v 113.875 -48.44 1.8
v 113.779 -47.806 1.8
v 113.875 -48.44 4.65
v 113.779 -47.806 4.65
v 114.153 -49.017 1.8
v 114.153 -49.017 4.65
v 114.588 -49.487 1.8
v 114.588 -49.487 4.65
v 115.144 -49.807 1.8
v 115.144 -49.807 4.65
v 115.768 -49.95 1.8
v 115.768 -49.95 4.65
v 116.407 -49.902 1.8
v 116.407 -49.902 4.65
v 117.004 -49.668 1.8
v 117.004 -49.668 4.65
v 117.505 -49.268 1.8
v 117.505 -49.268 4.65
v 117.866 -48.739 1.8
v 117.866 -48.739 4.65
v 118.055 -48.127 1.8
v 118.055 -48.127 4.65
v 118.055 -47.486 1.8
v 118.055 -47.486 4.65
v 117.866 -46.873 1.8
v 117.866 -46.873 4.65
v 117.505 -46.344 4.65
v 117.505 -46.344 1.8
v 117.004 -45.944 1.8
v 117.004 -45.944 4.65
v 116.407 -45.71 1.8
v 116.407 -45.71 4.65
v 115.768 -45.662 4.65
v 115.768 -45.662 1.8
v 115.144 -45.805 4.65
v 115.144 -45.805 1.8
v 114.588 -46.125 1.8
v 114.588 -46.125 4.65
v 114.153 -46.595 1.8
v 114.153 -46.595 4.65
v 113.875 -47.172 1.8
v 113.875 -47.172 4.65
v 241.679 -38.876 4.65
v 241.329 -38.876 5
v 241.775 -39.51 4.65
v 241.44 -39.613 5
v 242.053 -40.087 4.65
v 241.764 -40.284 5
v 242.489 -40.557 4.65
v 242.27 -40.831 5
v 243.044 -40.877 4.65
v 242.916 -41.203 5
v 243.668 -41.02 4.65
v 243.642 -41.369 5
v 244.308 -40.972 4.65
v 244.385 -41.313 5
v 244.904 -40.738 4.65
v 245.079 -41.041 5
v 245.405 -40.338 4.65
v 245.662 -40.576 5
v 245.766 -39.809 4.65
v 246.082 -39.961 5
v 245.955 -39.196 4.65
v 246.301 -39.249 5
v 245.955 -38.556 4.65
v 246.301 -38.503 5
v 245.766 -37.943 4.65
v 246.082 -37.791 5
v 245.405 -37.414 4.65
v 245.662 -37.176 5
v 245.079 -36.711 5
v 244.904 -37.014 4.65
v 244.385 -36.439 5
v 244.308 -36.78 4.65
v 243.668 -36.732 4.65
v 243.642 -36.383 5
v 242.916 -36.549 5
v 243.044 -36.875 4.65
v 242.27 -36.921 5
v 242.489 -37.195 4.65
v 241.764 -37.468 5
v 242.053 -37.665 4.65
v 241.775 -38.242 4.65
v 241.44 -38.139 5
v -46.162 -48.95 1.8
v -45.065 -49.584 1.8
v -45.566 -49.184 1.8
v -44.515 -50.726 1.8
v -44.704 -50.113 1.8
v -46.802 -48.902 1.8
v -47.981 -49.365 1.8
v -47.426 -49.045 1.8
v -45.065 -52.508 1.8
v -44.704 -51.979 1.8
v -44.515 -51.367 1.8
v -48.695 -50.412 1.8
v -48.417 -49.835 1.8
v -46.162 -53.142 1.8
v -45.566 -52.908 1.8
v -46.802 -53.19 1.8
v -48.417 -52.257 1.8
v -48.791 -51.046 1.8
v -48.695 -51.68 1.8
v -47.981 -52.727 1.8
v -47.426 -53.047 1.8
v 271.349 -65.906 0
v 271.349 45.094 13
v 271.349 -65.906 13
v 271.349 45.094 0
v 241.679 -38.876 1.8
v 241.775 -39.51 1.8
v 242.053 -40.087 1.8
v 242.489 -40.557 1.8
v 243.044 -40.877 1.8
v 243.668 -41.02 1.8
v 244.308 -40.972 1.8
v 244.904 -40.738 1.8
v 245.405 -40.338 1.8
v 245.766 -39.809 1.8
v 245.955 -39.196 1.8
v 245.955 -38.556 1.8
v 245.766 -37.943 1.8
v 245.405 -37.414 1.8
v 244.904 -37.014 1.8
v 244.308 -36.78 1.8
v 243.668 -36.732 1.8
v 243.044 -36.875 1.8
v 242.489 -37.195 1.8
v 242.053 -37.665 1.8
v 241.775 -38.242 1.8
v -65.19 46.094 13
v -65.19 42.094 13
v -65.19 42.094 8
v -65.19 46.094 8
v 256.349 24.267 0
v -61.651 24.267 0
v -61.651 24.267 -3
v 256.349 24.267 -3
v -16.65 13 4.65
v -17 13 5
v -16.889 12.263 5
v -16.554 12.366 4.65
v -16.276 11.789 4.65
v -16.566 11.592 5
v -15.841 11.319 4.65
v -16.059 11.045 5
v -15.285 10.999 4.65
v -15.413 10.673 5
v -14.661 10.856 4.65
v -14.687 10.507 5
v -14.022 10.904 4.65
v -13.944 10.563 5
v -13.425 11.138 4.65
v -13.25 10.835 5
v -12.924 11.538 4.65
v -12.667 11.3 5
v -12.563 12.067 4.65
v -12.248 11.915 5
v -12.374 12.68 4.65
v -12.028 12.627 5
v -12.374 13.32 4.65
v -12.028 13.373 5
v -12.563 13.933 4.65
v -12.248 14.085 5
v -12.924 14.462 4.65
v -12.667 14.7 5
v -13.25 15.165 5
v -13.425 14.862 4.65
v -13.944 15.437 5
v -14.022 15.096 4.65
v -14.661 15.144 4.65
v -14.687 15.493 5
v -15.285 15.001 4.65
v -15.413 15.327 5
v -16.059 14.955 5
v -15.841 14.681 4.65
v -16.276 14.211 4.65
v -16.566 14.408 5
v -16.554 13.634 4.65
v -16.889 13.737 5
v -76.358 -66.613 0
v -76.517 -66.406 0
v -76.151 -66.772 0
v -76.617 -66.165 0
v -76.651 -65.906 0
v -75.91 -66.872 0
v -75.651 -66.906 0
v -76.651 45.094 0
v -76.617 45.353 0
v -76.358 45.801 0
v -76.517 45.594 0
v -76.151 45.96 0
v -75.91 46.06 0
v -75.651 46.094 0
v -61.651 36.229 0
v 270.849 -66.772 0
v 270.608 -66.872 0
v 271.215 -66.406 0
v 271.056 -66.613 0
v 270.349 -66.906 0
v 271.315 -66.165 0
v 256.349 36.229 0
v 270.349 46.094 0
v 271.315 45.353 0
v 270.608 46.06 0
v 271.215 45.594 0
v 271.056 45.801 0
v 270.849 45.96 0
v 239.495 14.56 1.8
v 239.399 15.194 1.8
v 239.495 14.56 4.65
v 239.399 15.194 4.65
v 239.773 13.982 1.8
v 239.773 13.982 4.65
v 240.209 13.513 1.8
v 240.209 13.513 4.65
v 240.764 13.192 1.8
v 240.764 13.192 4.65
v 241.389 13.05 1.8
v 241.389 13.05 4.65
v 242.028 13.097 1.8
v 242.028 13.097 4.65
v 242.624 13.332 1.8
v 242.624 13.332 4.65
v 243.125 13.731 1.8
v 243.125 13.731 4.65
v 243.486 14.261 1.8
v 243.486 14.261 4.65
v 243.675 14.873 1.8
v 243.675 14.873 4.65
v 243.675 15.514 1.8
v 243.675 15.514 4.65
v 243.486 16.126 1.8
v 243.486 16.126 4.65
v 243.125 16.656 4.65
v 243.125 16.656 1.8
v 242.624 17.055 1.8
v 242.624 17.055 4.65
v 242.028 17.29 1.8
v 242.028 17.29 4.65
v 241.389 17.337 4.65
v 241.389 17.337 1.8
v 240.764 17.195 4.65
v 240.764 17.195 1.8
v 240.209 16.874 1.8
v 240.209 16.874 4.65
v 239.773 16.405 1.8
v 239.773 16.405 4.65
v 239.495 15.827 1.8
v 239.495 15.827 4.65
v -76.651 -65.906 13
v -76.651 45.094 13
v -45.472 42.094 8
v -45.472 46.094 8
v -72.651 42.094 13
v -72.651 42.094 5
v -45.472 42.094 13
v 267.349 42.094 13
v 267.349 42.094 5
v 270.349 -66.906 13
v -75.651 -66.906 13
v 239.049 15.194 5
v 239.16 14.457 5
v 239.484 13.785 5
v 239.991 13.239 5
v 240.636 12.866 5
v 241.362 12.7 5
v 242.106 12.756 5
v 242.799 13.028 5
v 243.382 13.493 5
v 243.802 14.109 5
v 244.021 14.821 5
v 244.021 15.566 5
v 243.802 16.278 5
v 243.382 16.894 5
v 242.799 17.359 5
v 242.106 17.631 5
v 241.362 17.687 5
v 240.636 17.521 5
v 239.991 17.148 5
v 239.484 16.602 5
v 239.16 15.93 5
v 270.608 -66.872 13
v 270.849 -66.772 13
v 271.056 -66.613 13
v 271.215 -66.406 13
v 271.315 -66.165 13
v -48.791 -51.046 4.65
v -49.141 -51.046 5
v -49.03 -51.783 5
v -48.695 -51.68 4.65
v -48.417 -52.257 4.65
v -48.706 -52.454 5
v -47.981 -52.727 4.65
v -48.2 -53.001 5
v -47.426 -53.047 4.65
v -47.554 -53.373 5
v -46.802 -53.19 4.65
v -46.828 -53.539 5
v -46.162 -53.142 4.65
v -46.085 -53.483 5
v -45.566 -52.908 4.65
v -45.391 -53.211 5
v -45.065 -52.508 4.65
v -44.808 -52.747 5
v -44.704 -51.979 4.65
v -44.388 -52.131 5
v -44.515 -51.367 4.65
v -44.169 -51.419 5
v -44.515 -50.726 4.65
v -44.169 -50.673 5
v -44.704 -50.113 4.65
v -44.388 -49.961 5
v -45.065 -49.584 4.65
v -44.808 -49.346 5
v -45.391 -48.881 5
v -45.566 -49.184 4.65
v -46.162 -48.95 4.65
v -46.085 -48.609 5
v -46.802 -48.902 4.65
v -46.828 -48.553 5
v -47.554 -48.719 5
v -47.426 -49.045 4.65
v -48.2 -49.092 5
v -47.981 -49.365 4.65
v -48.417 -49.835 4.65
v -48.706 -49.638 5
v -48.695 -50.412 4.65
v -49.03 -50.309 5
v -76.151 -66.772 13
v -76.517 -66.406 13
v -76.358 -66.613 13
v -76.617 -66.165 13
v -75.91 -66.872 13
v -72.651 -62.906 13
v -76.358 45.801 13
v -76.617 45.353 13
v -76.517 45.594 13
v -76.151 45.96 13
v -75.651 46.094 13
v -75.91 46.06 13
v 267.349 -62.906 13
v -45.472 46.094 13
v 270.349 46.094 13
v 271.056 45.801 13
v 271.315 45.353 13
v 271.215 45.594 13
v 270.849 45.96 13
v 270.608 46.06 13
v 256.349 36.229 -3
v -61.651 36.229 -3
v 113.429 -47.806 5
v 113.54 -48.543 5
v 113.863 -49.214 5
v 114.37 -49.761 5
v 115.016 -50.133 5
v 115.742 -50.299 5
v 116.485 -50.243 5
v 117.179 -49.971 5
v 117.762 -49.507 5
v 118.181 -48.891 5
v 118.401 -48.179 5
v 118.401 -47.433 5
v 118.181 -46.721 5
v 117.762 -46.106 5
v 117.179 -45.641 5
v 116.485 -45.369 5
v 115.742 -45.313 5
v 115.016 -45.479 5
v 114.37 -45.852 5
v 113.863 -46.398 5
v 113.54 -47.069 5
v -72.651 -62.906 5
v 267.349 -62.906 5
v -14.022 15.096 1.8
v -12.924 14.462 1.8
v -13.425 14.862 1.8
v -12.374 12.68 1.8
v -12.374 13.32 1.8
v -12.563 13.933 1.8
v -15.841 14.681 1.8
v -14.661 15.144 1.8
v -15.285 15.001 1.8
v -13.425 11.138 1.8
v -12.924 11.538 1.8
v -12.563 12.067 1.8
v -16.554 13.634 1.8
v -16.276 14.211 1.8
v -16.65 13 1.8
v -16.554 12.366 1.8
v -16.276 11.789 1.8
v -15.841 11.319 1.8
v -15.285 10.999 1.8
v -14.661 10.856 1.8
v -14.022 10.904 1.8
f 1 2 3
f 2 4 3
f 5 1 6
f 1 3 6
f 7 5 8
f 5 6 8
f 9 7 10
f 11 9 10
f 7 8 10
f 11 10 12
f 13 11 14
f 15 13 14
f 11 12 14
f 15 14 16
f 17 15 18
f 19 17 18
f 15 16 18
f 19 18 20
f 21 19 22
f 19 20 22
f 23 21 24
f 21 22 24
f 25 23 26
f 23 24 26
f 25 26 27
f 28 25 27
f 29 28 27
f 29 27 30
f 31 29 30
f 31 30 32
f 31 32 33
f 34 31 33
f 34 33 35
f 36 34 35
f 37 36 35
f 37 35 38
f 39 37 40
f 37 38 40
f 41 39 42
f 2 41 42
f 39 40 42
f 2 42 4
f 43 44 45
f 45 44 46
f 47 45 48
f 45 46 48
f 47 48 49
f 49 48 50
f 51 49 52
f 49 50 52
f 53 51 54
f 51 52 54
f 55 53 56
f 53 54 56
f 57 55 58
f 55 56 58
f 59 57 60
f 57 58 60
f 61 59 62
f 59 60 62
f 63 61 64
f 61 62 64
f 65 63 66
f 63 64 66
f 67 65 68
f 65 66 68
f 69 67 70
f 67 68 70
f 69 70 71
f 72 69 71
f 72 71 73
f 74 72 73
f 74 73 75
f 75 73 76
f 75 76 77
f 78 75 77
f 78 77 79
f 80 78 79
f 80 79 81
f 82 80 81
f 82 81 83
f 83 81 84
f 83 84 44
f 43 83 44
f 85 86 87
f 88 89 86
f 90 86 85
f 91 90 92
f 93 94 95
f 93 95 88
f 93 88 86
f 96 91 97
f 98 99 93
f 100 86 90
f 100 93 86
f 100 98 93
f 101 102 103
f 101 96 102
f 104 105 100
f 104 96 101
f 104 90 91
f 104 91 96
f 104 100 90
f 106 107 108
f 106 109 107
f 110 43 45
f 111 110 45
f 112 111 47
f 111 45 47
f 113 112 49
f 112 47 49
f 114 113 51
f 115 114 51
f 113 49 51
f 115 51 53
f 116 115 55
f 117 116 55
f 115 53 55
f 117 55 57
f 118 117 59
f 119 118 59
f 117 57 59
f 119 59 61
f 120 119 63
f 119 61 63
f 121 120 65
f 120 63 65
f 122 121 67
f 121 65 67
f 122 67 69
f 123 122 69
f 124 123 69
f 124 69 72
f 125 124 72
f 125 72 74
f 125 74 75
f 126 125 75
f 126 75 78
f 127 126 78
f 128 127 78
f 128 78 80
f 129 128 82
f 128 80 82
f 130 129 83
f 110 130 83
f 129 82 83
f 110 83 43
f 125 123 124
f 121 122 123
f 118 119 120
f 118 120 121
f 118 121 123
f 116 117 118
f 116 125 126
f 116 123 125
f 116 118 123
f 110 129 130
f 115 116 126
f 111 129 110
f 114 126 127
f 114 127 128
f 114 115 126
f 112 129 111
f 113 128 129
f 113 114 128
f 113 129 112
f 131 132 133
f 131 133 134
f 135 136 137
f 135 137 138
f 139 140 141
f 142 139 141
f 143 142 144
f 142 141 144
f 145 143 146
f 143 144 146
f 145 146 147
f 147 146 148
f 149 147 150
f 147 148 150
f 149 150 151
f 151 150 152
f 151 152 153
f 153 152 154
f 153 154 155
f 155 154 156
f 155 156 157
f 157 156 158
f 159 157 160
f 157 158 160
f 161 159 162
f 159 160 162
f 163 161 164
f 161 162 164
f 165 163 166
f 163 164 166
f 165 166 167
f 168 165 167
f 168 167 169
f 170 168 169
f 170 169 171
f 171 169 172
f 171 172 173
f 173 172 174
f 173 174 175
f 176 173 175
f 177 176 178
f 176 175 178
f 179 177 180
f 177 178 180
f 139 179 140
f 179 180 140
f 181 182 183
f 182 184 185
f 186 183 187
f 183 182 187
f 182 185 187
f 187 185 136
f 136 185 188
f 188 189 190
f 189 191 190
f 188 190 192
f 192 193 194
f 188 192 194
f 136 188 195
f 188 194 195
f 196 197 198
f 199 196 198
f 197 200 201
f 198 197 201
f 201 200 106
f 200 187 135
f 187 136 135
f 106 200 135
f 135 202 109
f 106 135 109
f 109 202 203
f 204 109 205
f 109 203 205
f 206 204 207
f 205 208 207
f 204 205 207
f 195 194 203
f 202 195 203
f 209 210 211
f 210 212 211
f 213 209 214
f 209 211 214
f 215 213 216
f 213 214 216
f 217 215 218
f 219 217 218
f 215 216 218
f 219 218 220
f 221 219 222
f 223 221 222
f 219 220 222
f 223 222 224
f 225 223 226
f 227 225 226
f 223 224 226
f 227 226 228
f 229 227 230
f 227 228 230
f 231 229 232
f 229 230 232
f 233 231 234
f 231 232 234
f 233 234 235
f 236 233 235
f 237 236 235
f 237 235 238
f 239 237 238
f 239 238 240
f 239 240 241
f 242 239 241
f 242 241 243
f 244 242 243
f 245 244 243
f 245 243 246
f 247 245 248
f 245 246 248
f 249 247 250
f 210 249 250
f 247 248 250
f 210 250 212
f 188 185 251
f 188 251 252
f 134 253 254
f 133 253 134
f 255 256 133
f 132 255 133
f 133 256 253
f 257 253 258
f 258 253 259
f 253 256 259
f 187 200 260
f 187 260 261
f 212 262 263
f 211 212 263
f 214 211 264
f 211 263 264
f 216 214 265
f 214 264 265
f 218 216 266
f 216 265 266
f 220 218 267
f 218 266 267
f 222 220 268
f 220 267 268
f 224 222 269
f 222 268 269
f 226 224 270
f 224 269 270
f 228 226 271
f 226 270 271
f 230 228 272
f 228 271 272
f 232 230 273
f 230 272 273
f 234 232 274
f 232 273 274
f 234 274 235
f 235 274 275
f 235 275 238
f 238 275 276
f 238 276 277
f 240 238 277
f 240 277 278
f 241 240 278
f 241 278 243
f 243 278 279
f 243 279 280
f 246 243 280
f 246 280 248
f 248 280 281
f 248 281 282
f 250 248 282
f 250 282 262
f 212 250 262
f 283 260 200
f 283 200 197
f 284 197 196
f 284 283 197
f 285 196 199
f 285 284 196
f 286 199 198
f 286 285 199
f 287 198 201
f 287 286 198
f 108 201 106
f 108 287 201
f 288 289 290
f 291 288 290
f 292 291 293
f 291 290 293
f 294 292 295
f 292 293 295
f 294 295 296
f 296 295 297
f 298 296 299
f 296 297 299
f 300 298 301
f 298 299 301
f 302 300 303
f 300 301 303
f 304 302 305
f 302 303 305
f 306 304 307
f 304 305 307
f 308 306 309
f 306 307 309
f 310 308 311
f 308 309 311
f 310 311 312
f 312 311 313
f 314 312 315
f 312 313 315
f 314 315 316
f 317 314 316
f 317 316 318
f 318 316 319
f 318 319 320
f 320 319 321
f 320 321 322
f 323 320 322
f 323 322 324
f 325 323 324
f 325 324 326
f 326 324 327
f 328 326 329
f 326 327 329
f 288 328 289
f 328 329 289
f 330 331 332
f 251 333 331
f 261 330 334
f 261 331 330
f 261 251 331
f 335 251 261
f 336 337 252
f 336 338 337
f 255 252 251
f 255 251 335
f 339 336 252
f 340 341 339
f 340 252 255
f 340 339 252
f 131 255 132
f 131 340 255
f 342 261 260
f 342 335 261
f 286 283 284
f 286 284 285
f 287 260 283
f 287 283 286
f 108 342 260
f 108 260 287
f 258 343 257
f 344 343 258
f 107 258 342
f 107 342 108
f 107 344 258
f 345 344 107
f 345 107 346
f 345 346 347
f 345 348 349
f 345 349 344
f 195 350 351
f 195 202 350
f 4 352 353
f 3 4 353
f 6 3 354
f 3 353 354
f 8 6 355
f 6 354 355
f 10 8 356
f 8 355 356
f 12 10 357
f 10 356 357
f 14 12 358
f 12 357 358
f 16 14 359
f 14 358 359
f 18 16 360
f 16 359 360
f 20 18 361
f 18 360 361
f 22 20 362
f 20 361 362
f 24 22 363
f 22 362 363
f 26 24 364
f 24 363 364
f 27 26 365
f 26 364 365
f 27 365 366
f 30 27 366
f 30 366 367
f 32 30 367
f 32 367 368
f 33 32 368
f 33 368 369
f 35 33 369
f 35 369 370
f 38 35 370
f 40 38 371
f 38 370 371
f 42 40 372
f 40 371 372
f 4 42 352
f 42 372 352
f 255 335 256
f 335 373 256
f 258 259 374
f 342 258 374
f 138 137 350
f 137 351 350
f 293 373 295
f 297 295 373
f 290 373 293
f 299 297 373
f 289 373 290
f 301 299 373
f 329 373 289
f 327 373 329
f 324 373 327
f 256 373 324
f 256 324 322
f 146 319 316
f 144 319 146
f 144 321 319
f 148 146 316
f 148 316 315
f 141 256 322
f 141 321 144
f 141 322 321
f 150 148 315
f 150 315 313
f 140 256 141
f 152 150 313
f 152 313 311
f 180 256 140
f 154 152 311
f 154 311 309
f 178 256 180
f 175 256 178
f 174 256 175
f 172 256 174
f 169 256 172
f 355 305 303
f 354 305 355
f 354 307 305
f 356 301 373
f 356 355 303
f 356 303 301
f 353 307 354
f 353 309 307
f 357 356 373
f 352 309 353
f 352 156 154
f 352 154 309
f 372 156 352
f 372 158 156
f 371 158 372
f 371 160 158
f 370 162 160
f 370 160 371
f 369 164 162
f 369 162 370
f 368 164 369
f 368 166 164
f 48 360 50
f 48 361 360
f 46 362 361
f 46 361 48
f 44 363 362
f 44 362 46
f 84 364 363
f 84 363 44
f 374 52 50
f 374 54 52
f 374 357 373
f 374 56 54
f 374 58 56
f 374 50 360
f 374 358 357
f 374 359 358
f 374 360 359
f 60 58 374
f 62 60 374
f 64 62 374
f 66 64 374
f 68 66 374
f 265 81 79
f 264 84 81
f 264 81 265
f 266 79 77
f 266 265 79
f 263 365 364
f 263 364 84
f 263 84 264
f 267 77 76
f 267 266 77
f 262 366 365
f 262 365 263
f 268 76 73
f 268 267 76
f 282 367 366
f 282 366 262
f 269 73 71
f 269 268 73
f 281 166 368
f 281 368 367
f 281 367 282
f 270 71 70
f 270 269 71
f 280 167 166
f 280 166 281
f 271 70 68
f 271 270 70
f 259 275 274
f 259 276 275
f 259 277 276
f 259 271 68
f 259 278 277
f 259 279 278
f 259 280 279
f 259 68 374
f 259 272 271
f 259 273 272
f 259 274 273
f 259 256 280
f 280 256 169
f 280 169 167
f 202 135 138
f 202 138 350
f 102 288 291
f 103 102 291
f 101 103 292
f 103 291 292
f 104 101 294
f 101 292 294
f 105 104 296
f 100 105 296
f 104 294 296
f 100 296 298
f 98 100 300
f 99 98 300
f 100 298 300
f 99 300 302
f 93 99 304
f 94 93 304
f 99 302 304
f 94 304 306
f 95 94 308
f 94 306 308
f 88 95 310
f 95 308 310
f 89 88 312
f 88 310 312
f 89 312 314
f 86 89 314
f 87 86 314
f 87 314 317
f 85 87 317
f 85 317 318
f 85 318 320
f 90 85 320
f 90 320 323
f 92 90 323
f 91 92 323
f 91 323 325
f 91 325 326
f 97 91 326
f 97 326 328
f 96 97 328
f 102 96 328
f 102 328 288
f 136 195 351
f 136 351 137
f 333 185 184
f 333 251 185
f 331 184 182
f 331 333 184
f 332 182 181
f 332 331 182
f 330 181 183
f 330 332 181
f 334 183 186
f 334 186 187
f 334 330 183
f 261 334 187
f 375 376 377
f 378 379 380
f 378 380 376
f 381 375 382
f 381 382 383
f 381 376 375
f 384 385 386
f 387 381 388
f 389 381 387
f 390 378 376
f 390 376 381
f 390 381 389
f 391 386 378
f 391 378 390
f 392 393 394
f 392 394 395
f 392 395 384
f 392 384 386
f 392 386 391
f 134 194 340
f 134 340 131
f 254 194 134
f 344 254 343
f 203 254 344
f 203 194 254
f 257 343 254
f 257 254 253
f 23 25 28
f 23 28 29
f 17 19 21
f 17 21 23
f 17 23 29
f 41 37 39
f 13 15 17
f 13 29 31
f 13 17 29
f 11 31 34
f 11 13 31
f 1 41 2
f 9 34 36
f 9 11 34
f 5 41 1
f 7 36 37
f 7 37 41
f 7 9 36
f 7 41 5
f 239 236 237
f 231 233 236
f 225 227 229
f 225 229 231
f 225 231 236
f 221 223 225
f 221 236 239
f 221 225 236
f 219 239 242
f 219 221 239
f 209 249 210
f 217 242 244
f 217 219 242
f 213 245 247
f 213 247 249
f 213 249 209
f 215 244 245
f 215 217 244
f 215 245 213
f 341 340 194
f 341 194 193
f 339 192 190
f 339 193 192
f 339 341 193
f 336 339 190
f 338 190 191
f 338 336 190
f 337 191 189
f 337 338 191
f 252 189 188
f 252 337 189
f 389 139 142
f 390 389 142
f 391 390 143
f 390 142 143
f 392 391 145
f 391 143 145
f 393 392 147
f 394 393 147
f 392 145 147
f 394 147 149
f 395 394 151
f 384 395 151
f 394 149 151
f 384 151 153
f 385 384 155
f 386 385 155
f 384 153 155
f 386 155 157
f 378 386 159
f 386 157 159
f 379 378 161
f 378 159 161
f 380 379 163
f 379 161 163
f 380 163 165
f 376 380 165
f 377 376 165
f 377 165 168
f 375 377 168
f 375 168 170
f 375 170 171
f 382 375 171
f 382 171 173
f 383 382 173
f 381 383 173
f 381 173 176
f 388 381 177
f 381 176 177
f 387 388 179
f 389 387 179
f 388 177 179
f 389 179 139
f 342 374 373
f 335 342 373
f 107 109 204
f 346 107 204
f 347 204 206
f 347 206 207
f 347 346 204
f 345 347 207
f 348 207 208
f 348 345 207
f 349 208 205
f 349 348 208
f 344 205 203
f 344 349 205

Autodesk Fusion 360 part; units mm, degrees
sketch "PCB" plane through (0, 0, 0) normal (0, 0, 1) x (1, 0, 0)
  line L0 (-71.6509, 41.0939) -> (266.3491, 41.0939)
  line L1 (266.3491, 41.0939) -> (266.3491, -61.9061)
  line L2 (266.3491, -61.9061) -> (-71.6509, -61.9061)
  line L3 (-71.6509, -61.9061) -> (-71.6509, 41.0939)
  circle A0 centre (-45.1809, -36.3161) radius 1.6
  circle A1 centre (-14.4909, 13.0239) radius 1.6
  circle A2 centre (115.9291, -47.8061) radius 1.6
  circle A3 centre (243.8291, -38.8761) radius 1.6
  circle A4 centre (241.5491, 15.1939) radius 1.6
  line L4 (-60.6509, 41.0939) -> (-51.6509, 41.0939)
  line L5 (-51.6509, 41.0939) -> (-51.6509, 34)
  line L6 (-51.6509, 34) -> (-60.6509, 34)
  line L7 (-60.6509, 34) -> (-60.6509, 41.0939)
  point P0 (-45.4739, -36.5361)
  point P1 (-40.6298, 20.2839)
  dimension "d1" = 338
  dimension "d2" = 103
  dimension "d3" = 3.2
  dimension "d4" = 25.59
  dimension "d5" = 26.47
  dimension "d6" = 3.2
  dimension "d7" = 28.07
  dimension "d8" = 57.16
  dimension "d9" = 3.2
  dimension "d10" = 14.1
  dimension "d11" = 150.42
  dimension "d12" = 3.2
  dimension "d13" = 22.52
  dimension "d14" = 23.03
  dimension "d15" = 3.2
  dimension "d16" = 24.8
  dimension "d17" = 25.9
  dimension "d32" = 11
  dimension "d33" = 20
sketch "Sketch2" plane through (0, 0, 0) normal (0, 0, 1) x (1, 0, 0)
  line L0 (-76.6509, 46.0939) -> (271.3491, 46.0939)
  line L1 (271.3491, 46.0939) -> (271.3491, -66.9061)
  line L2 (271.3491, -66.9061) -> (-76.6509, -66.9061)
  line L3 (-76.6509, -66.9061) -> (-76.6509, 46.0939)
  line L4 (-71.6509, 41.0939) -> (266.3491, 41.0939)
  line L5 (-71.6509, -61.9061) -> (-71.6509, 41.0939)
  line L6 (266.3491, -61.9061) -> (-71.6509, -61.9061)
  line L7 (266.3491, 41.0939) -> (266.3491, -61.9061)
  line L8 (-72.6509, 42.0939) -> (267.3491, 42.0939)
  line L9 (267.3491, 42.0939) -> (267.3491, -62.9061)
  line L10 (267.3491, -62.9061) -> (-72.6509, -62.9061)
  line L11 (-72.6509, -62.9061) -> (-72.6509, 42.0939)
  line L12 (-51.6509, 46.0939) -> (-51.6509, 39)
  line L13 (-60.6509, 39) -> (-60.6509, 46.0939)
  line L14 (-51.6509, 39) -> (-60.6509, 39)
  dimension "d18" = 5
  dimension "d19" = 5
  dimension "d20" = 5
  dimension "d21" = 5
  dimension "d24" = 4
  dimension "d25" = 4
  dimension "d26" = 4
  dimension "d27" = 4
extrude "Extrude1" add sketch "Sketch2" along normal blind 5 contours L4 L5 L6 L7 L12 L13 L14 | L4 L12 L13 L14
extrude "Extrude2" add sketch "Sketch2" along normal blind 5 contours L4 L5 L6 L7 L8 L9 L10 L11 L12 L13 | L4 L8 L12 L13
extrude "Extrude3" add sketch "Sketch2" along normal blind 13 contours L0 L1 L2 L3 L8 L9 L10 L11 L12 L13 | L0 L8 L12 L13
sketch "Sketch3" plane through (0, 0, 13) normal (0, 0, 1) x (-1, 0, 0)
  line L0 (-267.3491, 62.9061) -> (72.6509, 62.9061)
  line L1 (72.6509, 62.9061) -> (72.6509, -42.0939)
  line L2 (72.6509, -42.0939) -> (-267.3491, -42.0939)
  line L3 (-267.3491, -42.0939) -> (-267.3491, 62.9061)
  line L4 (76.6509, 66.9061) -> (-271.3491, 66.9061)
  line L5 (-271.3491, 66.9061) -> (-271.3491, -46.0939)
  line L6 (-271.3491, -46.0939) -> (76.6509, -46.0939)
  line L7 (76.6509, -46.0939) -> (76.6509, 66.9061)
  line L8 (65.1904, -46.0939) -> (45.472, -46.0939)
  line L9 (45.472, -46.0939) -> (45.472, -42.0939)
  line L10 (45.472, -42.0939) -> (65.1904, -42.0939)
  line L11 (65.1904, -42.0939) -> (65.1904, -46.0939)
extrude "Extrude4" cut sketch "Sketch3" against normal blind 5 contours L2 L6 L8 L9 L10 L11
sketch "HOLWS" plane through (0, 0, 5) normal (0, 0, 1) x (-1, 0, 0)
  line L0 (72.6509, 62.9061) -> (-267.3491, 62.9061)
  line L1 (-267.3491, 62.9061) -> (-267.3491, -42.0939)
  line L2 (-267.3491, -42.0939) -> (72.6509, -42.0939)
  line L3 (72.6509, -42.0939) -> (72.6509, 62.9061)
  circle A0 centre (14.5, -13) radius 2.15
  circle A1 centre (46.6409, 51.0461) radius 2.15
  circle A2 centre (-115.929, 47.8061) radius 2.15
  circle A3 centre (-243.8291, 38.876) radius 2.15
  circle A4 centre (-241.5493, -15.1935) radius 2.15
  dimension "d48" = 4.3
  dimension "d49" = 4.3
  dimension "d50" = 4.3
  dimension "d51" = 4.3
  dimension "d52" = 4.3
  dimension "d57" = 26.01
  dimension "d58" = 11.86
fillet "Fillet1" radius 1 1 edges at (-76.6509, -66.9061, 6.5)
fillet "Fillet2" radius 1 1 edges at (-76.6509, 46.0939, 6.5)
fillet "Fillet3" radius 1 1 edges at (271.3491, -66.9061, 6.5)
fillet "Fillet4" radius 1 1 edges at (271.3491, 46.0939, 6.5)
sketch "Sketch5" plane through (0, 0, 0) normal (0, 0, 1) x (1, 0, 0)
  line L0 (256.3491, 36.2293) -> (-61.6509, 36.2293)
  line L1 (-61.6509, 36.2293) -> (-61.6509, 24.2668)
  line L2 (-61.6509, 24.2668) -> (256.3491, 24.2668)
  line L3 (256.3491, 24.2668) -> (256.3491, 36.2293)
  line L4 (-71.6509, -61.9061) -> (-71.6509, 41.0939)
  line L5 (266.3491, 41.0939) -> (266.3491, -61.9061)
  dimension "d44" = 10
  dimension "d45" = 10
extrude "Extrude5" add sketch "Sketch5" against normal blind 3
extrude "Extrude6" cut sketch "HOLWS" against normal blind 3.2 contours A0 | A1 | A2 | A3 | A4
chamfer "Chamfer1" distance 0.35 angle 45 1 edges at (-12.4955, 12.2225, 5)
chamfer "Chamfer2" distance 0.35 angle 45 4 edges at (-44.6364, -51.8236, 5) (117.9335, -48.5836, 5) (243.5538, 14.416, 5) (245.8336, -39.6534, 5)
move_body "Move1" bodies 1 to x (1, 0, 0) y (0, 1, 0) z (0, 0, 1) at (60, 0, 0)
move_body "Move2" bodies 1 to x (1, 0, 0) y (0, 1, 0) z (0, 0, 1) at (0, -5, 0)
move_body "Move3" bodies 1 to x (1, 0, 0) y (0, 1, 0) z (0, 0, 1) at (-60, 5, 0)
sketch "Sketch6" plane through (0, 0, 1.8) normal (0, 0, 1) x (-1, 0, 0)
  circle A0 centre (14.5, -13) radius 2.15
